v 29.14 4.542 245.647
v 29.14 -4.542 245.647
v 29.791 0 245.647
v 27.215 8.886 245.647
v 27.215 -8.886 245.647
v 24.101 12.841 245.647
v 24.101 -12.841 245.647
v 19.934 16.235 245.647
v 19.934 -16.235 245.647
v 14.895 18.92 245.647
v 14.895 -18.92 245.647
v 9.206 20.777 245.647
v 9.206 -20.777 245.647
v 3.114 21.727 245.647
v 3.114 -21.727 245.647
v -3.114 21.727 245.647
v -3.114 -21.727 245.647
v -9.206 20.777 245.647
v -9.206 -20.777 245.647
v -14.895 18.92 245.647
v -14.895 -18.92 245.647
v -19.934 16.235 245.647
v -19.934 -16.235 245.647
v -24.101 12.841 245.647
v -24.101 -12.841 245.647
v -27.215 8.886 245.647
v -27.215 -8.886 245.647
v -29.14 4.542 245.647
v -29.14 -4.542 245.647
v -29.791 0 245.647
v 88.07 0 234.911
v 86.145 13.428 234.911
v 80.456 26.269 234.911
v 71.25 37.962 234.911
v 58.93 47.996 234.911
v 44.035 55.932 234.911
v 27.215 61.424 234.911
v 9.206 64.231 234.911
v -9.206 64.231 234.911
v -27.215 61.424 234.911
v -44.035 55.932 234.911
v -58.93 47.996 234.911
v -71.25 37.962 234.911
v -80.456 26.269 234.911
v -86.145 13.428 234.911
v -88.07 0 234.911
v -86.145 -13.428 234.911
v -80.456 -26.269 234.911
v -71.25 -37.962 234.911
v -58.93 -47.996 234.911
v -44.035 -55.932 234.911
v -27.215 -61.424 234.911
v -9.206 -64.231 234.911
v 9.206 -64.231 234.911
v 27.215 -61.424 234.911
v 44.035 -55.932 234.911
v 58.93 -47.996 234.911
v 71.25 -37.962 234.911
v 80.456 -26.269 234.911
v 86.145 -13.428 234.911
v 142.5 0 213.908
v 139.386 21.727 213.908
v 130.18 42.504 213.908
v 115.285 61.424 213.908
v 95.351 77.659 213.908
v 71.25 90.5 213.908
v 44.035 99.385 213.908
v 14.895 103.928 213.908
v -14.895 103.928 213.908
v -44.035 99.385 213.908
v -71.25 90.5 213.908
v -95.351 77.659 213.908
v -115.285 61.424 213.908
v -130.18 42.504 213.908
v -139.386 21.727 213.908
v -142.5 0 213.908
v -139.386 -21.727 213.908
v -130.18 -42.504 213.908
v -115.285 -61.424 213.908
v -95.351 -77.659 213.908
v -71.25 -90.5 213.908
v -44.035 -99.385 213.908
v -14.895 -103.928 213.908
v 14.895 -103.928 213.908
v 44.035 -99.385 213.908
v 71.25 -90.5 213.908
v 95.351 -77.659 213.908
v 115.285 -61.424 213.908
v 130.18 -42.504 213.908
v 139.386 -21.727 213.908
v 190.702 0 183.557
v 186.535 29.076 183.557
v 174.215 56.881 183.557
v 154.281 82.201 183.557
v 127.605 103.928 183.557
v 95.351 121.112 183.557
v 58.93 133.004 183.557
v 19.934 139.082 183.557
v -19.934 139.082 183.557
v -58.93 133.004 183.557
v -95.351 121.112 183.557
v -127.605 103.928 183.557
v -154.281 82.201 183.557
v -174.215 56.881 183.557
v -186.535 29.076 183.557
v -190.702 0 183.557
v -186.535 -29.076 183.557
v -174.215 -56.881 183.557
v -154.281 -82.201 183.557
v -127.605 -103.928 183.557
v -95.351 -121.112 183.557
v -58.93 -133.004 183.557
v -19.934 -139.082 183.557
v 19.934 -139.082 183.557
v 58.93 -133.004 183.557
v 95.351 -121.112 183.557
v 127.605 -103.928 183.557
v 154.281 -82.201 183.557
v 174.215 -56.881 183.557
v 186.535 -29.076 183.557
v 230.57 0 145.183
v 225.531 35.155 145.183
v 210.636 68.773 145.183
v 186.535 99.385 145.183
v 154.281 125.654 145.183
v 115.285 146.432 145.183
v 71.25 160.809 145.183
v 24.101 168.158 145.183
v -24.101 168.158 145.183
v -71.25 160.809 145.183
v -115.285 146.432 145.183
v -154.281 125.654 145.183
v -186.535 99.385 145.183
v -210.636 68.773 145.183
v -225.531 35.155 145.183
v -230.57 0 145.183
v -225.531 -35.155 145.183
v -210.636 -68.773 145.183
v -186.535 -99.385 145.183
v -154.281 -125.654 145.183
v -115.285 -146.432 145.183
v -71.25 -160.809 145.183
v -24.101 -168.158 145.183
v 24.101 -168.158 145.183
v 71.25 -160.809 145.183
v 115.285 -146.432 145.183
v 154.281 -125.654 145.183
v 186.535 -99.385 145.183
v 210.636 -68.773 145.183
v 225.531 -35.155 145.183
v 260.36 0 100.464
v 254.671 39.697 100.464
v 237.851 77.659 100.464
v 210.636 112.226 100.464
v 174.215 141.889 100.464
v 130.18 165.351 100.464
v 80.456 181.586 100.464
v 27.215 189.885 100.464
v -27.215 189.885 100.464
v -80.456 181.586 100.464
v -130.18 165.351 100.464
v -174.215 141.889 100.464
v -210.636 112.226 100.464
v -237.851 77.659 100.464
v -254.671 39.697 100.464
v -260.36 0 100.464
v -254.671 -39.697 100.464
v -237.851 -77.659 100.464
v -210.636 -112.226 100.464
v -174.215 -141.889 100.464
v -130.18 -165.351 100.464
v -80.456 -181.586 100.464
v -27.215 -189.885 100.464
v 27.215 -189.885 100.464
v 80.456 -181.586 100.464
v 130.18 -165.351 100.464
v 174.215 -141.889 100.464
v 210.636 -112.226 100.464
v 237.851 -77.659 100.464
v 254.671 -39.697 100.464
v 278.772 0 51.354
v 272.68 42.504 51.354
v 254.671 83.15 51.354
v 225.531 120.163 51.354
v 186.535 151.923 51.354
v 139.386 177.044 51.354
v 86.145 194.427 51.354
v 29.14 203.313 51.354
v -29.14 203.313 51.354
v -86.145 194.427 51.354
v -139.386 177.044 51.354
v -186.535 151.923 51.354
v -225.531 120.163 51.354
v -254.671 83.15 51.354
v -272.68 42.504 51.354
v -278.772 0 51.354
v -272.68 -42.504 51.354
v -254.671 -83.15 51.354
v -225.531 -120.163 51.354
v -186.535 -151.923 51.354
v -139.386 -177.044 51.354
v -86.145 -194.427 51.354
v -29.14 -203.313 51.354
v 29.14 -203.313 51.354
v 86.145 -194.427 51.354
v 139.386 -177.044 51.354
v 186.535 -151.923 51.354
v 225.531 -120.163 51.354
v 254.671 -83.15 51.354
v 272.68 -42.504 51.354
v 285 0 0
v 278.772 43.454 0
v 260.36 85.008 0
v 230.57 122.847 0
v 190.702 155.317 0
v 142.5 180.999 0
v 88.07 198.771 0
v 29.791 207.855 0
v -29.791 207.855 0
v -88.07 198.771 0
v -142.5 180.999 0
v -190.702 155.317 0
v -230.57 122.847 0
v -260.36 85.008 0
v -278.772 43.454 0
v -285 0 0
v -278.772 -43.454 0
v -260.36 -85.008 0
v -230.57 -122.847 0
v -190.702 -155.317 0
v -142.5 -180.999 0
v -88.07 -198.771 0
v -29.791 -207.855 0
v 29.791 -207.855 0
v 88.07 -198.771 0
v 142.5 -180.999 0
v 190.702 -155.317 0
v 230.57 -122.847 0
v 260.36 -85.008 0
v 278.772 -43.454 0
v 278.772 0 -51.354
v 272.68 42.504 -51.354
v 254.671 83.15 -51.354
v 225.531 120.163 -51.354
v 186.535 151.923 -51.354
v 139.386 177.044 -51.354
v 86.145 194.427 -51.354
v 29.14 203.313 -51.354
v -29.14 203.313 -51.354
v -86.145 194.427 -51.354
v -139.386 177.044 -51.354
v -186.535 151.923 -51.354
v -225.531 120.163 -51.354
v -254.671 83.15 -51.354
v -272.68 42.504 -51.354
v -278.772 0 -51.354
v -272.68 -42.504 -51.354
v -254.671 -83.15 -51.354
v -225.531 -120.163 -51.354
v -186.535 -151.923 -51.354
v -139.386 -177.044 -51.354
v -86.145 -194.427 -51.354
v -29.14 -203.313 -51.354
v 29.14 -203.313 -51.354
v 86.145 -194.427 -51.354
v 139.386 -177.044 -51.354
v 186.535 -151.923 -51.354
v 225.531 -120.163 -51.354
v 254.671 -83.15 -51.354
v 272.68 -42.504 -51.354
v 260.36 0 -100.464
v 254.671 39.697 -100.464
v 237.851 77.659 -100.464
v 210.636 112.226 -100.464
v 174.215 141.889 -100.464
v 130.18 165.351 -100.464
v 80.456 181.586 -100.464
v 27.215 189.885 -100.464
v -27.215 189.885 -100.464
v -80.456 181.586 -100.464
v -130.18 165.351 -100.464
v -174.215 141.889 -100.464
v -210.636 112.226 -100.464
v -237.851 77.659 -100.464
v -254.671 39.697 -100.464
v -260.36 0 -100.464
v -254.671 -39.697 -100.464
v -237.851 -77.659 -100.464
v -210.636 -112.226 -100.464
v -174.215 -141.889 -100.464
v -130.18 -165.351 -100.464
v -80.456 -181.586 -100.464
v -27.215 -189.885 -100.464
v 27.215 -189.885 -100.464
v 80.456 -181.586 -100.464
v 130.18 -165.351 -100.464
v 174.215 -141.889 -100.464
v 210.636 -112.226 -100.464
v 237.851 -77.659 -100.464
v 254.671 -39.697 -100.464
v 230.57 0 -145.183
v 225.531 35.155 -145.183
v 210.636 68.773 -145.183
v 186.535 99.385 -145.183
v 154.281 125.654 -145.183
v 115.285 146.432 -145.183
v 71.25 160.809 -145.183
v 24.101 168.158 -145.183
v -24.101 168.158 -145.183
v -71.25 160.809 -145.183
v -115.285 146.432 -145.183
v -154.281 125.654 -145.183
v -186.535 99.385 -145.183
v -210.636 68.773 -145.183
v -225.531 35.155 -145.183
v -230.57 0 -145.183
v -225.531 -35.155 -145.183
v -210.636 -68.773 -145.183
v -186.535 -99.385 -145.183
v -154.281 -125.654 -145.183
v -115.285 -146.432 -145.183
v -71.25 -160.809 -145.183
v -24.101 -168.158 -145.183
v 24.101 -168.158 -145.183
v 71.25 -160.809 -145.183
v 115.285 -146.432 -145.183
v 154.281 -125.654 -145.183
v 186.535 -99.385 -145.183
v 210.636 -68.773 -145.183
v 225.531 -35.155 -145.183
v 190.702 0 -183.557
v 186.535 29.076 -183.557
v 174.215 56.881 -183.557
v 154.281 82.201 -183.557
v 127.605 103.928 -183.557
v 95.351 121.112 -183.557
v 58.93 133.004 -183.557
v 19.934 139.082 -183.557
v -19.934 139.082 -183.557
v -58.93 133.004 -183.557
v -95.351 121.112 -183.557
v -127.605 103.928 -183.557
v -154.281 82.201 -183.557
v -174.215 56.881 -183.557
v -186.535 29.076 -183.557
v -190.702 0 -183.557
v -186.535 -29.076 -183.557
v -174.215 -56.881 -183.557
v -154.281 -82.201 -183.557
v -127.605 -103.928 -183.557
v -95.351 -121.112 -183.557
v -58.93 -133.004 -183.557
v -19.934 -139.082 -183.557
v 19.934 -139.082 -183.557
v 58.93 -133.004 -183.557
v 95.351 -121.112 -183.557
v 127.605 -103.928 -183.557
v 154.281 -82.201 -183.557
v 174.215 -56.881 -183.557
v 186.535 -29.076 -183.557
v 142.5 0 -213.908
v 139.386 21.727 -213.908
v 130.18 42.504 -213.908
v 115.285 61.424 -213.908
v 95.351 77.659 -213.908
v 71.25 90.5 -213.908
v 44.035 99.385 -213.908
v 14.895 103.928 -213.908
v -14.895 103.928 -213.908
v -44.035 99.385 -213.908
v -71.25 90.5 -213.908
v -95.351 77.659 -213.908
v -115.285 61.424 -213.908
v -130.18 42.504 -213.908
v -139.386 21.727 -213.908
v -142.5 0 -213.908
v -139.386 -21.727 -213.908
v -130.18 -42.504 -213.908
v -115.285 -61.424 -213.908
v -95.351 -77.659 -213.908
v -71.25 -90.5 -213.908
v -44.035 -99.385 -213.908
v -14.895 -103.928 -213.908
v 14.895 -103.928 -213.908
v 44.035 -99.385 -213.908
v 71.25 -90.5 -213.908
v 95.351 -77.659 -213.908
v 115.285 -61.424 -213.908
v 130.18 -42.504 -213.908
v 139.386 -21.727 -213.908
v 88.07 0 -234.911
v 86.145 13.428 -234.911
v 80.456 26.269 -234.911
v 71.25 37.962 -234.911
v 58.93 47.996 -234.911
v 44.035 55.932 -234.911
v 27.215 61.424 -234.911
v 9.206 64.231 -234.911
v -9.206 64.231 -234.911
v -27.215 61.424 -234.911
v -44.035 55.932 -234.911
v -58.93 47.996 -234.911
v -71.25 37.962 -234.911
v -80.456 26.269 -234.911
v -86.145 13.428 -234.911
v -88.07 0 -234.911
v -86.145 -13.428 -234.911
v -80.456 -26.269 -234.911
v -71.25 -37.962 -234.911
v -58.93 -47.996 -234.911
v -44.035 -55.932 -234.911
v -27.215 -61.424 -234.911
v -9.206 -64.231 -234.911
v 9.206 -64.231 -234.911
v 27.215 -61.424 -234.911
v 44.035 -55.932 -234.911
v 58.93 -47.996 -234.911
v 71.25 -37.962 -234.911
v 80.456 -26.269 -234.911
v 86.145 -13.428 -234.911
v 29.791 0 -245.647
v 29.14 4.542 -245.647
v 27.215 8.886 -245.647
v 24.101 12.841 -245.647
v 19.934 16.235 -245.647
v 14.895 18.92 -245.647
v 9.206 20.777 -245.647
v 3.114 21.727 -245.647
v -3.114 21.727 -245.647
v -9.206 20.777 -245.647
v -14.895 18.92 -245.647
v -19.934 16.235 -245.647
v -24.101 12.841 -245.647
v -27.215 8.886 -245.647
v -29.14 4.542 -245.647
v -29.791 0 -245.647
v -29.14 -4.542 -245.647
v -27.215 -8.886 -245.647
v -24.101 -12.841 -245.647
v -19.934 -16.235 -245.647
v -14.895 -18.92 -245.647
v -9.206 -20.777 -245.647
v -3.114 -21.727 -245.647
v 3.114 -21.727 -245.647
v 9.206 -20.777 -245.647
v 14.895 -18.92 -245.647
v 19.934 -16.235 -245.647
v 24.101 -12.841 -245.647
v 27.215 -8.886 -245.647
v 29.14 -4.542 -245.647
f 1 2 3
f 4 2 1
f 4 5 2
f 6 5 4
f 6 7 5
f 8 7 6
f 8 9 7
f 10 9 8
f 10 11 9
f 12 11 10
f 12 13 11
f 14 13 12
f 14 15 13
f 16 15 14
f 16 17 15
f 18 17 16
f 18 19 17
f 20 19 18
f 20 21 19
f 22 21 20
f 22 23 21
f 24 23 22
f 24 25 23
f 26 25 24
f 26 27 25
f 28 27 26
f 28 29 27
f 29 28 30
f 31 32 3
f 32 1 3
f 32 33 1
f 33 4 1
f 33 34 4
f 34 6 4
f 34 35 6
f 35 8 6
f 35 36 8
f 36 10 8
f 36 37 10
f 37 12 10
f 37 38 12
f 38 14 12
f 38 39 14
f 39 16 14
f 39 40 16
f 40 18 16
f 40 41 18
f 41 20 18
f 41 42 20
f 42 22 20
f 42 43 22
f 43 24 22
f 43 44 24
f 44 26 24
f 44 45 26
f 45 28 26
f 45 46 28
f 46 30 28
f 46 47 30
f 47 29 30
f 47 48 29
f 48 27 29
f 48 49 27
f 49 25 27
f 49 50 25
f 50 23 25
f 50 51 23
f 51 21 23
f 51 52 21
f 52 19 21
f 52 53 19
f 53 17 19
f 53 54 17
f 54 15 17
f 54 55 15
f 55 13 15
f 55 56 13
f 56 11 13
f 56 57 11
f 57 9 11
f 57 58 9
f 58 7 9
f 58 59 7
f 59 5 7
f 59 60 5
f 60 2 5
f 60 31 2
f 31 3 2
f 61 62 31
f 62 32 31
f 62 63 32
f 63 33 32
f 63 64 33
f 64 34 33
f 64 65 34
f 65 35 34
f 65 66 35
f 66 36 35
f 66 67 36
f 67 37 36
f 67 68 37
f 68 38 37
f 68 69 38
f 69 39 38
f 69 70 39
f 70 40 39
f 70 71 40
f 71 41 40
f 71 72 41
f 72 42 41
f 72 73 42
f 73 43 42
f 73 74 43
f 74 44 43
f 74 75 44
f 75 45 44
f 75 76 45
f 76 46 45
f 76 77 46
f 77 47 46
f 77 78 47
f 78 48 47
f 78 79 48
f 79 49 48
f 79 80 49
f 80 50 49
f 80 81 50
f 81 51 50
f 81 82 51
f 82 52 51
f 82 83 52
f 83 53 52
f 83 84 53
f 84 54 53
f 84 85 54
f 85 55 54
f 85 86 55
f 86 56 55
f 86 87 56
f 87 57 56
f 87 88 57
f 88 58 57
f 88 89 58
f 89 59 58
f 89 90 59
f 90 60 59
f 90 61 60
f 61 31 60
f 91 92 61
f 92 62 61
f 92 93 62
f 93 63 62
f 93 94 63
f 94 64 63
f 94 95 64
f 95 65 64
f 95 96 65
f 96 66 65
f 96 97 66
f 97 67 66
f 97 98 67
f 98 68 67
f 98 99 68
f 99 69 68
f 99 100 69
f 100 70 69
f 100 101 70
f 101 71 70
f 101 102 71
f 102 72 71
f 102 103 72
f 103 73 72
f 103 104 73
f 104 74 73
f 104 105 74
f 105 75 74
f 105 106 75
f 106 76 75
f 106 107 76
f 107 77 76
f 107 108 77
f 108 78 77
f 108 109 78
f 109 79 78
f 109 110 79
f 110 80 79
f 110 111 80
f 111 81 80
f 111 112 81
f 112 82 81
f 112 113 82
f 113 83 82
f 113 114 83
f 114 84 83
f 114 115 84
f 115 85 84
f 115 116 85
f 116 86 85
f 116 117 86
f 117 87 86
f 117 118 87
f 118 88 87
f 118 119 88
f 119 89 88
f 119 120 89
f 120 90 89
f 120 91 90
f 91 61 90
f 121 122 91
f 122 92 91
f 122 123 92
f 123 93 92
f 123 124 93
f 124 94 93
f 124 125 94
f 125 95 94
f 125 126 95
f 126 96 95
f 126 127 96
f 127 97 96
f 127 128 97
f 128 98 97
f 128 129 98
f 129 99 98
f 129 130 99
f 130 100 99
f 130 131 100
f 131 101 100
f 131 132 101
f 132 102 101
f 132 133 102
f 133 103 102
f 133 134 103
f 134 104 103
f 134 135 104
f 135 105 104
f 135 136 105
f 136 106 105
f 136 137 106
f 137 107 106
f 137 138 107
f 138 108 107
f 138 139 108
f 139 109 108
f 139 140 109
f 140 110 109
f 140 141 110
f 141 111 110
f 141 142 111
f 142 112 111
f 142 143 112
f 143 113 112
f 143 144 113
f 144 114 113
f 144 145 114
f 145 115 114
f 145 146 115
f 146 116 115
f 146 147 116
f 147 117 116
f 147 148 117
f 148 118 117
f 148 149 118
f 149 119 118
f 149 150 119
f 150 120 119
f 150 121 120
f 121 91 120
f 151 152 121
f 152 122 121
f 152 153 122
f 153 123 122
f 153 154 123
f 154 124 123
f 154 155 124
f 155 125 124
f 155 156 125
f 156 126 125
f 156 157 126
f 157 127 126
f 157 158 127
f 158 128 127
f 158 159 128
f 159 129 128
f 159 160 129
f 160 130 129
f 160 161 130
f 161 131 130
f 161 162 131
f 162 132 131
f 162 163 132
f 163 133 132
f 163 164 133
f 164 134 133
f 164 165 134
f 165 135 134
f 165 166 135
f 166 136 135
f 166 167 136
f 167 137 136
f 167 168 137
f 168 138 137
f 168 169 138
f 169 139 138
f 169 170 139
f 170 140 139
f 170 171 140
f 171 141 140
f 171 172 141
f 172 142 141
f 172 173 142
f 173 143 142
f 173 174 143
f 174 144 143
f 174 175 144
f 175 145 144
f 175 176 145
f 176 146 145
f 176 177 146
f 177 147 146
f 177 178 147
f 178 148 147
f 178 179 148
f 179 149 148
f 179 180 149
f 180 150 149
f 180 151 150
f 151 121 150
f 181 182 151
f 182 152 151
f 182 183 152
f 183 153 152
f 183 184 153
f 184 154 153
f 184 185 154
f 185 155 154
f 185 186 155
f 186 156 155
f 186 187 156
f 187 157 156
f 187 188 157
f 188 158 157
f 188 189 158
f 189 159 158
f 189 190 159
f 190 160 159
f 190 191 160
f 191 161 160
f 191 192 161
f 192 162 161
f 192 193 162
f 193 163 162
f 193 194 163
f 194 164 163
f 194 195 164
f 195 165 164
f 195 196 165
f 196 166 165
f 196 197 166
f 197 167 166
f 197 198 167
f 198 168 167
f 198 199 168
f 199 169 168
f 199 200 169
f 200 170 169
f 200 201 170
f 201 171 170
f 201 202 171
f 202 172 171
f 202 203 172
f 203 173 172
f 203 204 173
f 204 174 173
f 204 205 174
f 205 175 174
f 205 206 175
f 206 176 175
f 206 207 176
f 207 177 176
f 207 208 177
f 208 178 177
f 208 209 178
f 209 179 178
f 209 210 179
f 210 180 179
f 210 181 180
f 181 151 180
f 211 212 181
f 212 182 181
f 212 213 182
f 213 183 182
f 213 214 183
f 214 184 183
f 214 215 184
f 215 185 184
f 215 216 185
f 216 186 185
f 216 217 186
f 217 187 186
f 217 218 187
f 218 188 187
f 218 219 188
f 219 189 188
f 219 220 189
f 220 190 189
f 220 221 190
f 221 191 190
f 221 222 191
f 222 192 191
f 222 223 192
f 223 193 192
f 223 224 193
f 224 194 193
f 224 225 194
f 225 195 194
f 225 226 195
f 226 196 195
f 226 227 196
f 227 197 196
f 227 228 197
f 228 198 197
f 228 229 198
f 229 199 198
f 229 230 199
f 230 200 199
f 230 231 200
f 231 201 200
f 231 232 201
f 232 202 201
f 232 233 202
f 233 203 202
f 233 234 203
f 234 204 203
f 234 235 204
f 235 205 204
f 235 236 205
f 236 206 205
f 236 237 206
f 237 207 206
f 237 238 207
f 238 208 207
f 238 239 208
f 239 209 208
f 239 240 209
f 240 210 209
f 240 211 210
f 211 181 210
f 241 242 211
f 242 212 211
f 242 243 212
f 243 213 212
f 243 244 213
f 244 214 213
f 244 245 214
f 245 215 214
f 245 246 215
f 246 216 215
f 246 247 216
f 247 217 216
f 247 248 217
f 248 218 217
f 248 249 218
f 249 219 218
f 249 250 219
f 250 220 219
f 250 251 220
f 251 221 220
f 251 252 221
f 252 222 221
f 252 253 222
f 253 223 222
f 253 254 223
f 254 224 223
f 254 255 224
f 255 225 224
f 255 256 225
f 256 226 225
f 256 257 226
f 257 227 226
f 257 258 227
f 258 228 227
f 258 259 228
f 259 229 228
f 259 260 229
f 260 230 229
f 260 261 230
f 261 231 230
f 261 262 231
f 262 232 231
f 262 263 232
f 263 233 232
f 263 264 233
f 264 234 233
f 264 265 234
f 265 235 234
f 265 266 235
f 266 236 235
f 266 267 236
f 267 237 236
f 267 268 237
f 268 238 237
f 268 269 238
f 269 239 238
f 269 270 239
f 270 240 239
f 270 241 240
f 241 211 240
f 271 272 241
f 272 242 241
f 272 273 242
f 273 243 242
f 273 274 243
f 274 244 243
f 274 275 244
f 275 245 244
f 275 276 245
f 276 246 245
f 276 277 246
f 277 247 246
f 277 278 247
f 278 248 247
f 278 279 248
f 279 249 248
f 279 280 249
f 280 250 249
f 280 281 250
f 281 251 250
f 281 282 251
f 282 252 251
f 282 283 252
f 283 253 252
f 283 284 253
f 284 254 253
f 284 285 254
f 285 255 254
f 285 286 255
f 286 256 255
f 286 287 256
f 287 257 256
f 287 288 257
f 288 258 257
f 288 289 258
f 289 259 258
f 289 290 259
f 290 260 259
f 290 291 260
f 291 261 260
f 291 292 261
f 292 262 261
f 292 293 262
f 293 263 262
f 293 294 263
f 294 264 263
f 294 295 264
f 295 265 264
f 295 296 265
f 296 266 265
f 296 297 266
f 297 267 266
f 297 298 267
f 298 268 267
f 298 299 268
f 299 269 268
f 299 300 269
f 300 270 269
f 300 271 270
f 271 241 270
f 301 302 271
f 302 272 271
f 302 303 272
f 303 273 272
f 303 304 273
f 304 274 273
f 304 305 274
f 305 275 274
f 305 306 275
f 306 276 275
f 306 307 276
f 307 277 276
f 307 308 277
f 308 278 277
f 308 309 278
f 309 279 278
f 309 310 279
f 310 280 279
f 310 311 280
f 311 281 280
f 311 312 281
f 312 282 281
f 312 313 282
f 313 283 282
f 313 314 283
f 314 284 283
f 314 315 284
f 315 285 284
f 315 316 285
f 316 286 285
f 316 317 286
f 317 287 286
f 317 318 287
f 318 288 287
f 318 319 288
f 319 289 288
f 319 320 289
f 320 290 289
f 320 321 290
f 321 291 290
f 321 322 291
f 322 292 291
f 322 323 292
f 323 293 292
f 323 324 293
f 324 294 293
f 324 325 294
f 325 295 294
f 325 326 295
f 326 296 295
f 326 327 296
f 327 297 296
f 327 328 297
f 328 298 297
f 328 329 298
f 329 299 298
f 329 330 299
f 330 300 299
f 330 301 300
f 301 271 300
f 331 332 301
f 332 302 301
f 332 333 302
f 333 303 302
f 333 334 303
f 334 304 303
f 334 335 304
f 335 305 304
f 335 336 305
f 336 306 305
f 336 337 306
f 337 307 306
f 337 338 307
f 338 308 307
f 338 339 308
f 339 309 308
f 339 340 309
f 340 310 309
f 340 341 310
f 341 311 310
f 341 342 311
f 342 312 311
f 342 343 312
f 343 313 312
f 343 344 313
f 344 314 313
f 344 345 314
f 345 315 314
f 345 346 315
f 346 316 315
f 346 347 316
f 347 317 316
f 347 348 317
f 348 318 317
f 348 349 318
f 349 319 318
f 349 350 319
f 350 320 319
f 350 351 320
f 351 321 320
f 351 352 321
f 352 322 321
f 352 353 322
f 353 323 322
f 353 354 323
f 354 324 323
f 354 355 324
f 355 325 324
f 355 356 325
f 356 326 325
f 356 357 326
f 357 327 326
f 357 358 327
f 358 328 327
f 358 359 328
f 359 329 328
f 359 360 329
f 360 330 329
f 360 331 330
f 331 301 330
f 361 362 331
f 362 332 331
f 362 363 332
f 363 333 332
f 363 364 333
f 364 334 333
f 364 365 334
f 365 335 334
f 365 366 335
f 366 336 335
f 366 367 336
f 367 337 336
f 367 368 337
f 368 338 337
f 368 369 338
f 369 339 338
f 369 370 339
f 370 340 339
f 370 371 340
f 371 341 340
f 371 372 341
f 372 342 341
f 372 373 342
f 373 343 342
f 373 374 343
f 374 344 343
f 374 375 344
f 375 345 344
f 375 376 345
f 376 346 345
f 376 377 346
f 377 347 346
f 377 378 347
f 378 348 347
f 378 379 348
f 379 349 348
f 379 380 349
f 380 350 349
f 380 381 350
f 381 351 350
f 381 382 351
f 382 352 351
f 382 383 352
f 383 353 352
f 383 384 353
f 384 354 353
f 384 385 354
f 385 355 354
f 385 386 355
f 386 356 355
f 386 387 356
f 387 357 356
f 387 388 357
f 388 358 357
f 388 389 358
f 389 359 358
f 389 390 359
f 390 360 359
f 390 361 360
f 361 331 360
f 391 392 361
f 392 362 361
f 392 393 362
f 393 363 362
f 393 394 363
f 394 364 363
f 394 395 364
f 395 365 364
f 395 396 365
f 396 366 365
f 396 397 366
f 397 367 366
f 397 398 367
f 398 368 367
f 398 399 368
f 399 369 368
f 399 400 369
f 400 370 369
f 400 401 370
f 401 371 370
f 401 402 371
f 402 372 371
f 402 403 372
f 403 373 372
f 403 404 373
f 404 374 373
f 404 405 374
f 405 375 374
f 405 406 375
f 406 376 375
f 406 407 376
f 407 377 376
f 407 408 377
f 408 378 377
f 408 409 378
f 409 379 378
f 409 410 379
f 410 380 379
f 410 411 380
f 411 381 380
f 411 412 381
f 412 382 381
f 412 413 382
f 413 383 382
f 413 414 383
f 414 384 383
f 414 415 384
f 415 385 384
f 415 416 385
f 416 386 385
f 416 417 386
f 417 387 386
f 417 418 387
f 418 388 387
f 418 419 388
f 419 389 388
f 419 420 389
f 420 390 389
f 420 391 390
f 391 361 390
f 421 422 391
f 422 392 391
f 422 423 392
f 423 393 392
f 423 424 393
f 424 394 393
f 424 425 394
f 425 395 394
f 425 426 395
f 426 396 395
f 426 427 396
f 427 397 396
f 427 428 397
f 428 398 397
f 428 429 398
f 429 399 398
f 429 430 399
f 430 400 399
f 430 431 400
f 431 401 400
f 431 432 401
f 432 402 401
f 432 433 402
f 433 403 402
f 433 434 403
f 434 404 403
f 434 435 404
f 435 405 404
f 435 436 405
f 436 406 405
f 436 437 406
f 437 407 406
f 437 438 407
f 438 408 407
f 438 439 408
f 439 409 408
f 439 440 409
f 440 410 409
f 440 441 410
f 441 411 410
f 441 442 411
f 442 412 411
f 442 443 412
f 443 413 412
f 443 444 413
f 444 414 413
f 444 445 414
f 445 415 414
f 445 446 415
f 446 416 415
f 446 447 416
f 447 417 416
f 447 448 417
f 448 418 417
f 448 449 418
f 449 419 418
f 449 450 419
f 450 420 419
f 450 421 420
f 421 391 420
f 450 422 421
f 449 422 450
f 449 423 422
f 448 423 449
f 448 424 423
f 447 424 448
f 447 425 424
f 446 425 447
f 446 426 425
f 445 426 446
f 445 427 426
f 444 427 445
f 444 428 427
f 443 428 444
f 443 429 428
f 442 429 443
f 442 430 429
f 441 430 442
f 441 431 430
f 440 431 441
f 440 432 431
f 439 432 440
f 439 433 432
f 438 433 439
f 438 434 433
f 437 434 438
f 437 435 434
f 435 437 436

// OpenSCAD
// Generated by SolidPython 1.0.1 on 2020-07-29 00:46:52


scale(v = [15, 11, 13]) {
	sphere(r = 19);
}
/***********************************************
*********      SolidPython code:      **********
************************************************
 
# import packages: SolidPython
from solid import *
from solid.utils import *
from itertools import chain, combinations, permutations


class Resize:

    def __init__(self, scad_file):
        self.scad_file = scad_file
        #self.scad_file = import_scad(scad_file)
        # cone/cylinder param:
        self.r1 = 0
        self.r2 = 0
        self.h = 0
        # rectangular prism param:
        self.w = 0
        self.l = 0
        # ellipse param:
        self.r = 0

    # import OpenScad code (file name corresponds to shape)


    # classify shape + parameters
    def assign(self, param1, param2, param3):
        if self.scad_file == 'cone.scad':
            self.r1 = param1
            self.r2 = param2
            self.h = param3
        elif self.scad_file == 'cylinder.scad':
            self.r1 = param1
            self.r2 = param2
            self.h = param3
        elif self.scad_file == 'rectangularPrism.scad':
            self.h = param1
            self.l = param2
            self.w = param3
        else:
            self.r = param1
            self.h = param2

    # resize parameters
    def iterate(self):
        x = range(3, 20, 2)
        i = 1
        if self.scad_file == 'cone.scad':
            tempList = list(permutations(x, 2))
            for temp in tempList:
                param1 = temp[0]
                param2 = temp[1]
                filepath = 'produced_scad_files/' + 'cone' + str(param1) + '_' + str(param2) + '_' + '.scad'
                scad_render_to_file(cylinder(h=param1, r1=param2, r2=0), filepath)

        elif self.scad_file == 'cylinder.scad':
            tempList = list(permutations(x, 3))
            for temp in tempList:
                param1 = temp[0]
                param2 = temp[1]
                filepath = 'produced_scad_files/' + 'cylinder' + str(param1) + '_' + str(param2) + '_' + '.scad'
                scad_render_to_file(cylinder(h=param1, r1=param2, r2=param2), filepath)

        elif self.scad_file == 'rectangularPrism.scad':
            tempList = list(permutations(x, 3))
            for temp in tempList:
                param1 = temp[0]
                param2 = temp[1]
                param3 = temp[2]
                filepath = 'produced_scad_files/' + 'rectangularPrism' + str(param1) + '_' + str(param2) + '_' + str(
                    param3) + '.scad'
                scad_render_to_file(cube(size=(param1, param2, param3)), filepath)

        elif self.scad_file == 'ellipse.scad':
            tempList = list(permutations(x, 4))
            for temp in tempList:
                param1 = temp[0]
                param2 = temp[1]
                param3 = temp[2]
                param4 = temp[3]
                filepath = 'produced_scad_files/' + 'ellipse' + str(param1) + '_' + str(param2) + '_' + str(param3) + '_' + str(param4) + '.scad'
                scad_render_to_file(scale([param1, param2, param3])(sphere(r=param4)), filepath)

    def render_to_scadfile(self):
        scad_render_to_file(scad, 'example.scad') 
 
************************************************/
